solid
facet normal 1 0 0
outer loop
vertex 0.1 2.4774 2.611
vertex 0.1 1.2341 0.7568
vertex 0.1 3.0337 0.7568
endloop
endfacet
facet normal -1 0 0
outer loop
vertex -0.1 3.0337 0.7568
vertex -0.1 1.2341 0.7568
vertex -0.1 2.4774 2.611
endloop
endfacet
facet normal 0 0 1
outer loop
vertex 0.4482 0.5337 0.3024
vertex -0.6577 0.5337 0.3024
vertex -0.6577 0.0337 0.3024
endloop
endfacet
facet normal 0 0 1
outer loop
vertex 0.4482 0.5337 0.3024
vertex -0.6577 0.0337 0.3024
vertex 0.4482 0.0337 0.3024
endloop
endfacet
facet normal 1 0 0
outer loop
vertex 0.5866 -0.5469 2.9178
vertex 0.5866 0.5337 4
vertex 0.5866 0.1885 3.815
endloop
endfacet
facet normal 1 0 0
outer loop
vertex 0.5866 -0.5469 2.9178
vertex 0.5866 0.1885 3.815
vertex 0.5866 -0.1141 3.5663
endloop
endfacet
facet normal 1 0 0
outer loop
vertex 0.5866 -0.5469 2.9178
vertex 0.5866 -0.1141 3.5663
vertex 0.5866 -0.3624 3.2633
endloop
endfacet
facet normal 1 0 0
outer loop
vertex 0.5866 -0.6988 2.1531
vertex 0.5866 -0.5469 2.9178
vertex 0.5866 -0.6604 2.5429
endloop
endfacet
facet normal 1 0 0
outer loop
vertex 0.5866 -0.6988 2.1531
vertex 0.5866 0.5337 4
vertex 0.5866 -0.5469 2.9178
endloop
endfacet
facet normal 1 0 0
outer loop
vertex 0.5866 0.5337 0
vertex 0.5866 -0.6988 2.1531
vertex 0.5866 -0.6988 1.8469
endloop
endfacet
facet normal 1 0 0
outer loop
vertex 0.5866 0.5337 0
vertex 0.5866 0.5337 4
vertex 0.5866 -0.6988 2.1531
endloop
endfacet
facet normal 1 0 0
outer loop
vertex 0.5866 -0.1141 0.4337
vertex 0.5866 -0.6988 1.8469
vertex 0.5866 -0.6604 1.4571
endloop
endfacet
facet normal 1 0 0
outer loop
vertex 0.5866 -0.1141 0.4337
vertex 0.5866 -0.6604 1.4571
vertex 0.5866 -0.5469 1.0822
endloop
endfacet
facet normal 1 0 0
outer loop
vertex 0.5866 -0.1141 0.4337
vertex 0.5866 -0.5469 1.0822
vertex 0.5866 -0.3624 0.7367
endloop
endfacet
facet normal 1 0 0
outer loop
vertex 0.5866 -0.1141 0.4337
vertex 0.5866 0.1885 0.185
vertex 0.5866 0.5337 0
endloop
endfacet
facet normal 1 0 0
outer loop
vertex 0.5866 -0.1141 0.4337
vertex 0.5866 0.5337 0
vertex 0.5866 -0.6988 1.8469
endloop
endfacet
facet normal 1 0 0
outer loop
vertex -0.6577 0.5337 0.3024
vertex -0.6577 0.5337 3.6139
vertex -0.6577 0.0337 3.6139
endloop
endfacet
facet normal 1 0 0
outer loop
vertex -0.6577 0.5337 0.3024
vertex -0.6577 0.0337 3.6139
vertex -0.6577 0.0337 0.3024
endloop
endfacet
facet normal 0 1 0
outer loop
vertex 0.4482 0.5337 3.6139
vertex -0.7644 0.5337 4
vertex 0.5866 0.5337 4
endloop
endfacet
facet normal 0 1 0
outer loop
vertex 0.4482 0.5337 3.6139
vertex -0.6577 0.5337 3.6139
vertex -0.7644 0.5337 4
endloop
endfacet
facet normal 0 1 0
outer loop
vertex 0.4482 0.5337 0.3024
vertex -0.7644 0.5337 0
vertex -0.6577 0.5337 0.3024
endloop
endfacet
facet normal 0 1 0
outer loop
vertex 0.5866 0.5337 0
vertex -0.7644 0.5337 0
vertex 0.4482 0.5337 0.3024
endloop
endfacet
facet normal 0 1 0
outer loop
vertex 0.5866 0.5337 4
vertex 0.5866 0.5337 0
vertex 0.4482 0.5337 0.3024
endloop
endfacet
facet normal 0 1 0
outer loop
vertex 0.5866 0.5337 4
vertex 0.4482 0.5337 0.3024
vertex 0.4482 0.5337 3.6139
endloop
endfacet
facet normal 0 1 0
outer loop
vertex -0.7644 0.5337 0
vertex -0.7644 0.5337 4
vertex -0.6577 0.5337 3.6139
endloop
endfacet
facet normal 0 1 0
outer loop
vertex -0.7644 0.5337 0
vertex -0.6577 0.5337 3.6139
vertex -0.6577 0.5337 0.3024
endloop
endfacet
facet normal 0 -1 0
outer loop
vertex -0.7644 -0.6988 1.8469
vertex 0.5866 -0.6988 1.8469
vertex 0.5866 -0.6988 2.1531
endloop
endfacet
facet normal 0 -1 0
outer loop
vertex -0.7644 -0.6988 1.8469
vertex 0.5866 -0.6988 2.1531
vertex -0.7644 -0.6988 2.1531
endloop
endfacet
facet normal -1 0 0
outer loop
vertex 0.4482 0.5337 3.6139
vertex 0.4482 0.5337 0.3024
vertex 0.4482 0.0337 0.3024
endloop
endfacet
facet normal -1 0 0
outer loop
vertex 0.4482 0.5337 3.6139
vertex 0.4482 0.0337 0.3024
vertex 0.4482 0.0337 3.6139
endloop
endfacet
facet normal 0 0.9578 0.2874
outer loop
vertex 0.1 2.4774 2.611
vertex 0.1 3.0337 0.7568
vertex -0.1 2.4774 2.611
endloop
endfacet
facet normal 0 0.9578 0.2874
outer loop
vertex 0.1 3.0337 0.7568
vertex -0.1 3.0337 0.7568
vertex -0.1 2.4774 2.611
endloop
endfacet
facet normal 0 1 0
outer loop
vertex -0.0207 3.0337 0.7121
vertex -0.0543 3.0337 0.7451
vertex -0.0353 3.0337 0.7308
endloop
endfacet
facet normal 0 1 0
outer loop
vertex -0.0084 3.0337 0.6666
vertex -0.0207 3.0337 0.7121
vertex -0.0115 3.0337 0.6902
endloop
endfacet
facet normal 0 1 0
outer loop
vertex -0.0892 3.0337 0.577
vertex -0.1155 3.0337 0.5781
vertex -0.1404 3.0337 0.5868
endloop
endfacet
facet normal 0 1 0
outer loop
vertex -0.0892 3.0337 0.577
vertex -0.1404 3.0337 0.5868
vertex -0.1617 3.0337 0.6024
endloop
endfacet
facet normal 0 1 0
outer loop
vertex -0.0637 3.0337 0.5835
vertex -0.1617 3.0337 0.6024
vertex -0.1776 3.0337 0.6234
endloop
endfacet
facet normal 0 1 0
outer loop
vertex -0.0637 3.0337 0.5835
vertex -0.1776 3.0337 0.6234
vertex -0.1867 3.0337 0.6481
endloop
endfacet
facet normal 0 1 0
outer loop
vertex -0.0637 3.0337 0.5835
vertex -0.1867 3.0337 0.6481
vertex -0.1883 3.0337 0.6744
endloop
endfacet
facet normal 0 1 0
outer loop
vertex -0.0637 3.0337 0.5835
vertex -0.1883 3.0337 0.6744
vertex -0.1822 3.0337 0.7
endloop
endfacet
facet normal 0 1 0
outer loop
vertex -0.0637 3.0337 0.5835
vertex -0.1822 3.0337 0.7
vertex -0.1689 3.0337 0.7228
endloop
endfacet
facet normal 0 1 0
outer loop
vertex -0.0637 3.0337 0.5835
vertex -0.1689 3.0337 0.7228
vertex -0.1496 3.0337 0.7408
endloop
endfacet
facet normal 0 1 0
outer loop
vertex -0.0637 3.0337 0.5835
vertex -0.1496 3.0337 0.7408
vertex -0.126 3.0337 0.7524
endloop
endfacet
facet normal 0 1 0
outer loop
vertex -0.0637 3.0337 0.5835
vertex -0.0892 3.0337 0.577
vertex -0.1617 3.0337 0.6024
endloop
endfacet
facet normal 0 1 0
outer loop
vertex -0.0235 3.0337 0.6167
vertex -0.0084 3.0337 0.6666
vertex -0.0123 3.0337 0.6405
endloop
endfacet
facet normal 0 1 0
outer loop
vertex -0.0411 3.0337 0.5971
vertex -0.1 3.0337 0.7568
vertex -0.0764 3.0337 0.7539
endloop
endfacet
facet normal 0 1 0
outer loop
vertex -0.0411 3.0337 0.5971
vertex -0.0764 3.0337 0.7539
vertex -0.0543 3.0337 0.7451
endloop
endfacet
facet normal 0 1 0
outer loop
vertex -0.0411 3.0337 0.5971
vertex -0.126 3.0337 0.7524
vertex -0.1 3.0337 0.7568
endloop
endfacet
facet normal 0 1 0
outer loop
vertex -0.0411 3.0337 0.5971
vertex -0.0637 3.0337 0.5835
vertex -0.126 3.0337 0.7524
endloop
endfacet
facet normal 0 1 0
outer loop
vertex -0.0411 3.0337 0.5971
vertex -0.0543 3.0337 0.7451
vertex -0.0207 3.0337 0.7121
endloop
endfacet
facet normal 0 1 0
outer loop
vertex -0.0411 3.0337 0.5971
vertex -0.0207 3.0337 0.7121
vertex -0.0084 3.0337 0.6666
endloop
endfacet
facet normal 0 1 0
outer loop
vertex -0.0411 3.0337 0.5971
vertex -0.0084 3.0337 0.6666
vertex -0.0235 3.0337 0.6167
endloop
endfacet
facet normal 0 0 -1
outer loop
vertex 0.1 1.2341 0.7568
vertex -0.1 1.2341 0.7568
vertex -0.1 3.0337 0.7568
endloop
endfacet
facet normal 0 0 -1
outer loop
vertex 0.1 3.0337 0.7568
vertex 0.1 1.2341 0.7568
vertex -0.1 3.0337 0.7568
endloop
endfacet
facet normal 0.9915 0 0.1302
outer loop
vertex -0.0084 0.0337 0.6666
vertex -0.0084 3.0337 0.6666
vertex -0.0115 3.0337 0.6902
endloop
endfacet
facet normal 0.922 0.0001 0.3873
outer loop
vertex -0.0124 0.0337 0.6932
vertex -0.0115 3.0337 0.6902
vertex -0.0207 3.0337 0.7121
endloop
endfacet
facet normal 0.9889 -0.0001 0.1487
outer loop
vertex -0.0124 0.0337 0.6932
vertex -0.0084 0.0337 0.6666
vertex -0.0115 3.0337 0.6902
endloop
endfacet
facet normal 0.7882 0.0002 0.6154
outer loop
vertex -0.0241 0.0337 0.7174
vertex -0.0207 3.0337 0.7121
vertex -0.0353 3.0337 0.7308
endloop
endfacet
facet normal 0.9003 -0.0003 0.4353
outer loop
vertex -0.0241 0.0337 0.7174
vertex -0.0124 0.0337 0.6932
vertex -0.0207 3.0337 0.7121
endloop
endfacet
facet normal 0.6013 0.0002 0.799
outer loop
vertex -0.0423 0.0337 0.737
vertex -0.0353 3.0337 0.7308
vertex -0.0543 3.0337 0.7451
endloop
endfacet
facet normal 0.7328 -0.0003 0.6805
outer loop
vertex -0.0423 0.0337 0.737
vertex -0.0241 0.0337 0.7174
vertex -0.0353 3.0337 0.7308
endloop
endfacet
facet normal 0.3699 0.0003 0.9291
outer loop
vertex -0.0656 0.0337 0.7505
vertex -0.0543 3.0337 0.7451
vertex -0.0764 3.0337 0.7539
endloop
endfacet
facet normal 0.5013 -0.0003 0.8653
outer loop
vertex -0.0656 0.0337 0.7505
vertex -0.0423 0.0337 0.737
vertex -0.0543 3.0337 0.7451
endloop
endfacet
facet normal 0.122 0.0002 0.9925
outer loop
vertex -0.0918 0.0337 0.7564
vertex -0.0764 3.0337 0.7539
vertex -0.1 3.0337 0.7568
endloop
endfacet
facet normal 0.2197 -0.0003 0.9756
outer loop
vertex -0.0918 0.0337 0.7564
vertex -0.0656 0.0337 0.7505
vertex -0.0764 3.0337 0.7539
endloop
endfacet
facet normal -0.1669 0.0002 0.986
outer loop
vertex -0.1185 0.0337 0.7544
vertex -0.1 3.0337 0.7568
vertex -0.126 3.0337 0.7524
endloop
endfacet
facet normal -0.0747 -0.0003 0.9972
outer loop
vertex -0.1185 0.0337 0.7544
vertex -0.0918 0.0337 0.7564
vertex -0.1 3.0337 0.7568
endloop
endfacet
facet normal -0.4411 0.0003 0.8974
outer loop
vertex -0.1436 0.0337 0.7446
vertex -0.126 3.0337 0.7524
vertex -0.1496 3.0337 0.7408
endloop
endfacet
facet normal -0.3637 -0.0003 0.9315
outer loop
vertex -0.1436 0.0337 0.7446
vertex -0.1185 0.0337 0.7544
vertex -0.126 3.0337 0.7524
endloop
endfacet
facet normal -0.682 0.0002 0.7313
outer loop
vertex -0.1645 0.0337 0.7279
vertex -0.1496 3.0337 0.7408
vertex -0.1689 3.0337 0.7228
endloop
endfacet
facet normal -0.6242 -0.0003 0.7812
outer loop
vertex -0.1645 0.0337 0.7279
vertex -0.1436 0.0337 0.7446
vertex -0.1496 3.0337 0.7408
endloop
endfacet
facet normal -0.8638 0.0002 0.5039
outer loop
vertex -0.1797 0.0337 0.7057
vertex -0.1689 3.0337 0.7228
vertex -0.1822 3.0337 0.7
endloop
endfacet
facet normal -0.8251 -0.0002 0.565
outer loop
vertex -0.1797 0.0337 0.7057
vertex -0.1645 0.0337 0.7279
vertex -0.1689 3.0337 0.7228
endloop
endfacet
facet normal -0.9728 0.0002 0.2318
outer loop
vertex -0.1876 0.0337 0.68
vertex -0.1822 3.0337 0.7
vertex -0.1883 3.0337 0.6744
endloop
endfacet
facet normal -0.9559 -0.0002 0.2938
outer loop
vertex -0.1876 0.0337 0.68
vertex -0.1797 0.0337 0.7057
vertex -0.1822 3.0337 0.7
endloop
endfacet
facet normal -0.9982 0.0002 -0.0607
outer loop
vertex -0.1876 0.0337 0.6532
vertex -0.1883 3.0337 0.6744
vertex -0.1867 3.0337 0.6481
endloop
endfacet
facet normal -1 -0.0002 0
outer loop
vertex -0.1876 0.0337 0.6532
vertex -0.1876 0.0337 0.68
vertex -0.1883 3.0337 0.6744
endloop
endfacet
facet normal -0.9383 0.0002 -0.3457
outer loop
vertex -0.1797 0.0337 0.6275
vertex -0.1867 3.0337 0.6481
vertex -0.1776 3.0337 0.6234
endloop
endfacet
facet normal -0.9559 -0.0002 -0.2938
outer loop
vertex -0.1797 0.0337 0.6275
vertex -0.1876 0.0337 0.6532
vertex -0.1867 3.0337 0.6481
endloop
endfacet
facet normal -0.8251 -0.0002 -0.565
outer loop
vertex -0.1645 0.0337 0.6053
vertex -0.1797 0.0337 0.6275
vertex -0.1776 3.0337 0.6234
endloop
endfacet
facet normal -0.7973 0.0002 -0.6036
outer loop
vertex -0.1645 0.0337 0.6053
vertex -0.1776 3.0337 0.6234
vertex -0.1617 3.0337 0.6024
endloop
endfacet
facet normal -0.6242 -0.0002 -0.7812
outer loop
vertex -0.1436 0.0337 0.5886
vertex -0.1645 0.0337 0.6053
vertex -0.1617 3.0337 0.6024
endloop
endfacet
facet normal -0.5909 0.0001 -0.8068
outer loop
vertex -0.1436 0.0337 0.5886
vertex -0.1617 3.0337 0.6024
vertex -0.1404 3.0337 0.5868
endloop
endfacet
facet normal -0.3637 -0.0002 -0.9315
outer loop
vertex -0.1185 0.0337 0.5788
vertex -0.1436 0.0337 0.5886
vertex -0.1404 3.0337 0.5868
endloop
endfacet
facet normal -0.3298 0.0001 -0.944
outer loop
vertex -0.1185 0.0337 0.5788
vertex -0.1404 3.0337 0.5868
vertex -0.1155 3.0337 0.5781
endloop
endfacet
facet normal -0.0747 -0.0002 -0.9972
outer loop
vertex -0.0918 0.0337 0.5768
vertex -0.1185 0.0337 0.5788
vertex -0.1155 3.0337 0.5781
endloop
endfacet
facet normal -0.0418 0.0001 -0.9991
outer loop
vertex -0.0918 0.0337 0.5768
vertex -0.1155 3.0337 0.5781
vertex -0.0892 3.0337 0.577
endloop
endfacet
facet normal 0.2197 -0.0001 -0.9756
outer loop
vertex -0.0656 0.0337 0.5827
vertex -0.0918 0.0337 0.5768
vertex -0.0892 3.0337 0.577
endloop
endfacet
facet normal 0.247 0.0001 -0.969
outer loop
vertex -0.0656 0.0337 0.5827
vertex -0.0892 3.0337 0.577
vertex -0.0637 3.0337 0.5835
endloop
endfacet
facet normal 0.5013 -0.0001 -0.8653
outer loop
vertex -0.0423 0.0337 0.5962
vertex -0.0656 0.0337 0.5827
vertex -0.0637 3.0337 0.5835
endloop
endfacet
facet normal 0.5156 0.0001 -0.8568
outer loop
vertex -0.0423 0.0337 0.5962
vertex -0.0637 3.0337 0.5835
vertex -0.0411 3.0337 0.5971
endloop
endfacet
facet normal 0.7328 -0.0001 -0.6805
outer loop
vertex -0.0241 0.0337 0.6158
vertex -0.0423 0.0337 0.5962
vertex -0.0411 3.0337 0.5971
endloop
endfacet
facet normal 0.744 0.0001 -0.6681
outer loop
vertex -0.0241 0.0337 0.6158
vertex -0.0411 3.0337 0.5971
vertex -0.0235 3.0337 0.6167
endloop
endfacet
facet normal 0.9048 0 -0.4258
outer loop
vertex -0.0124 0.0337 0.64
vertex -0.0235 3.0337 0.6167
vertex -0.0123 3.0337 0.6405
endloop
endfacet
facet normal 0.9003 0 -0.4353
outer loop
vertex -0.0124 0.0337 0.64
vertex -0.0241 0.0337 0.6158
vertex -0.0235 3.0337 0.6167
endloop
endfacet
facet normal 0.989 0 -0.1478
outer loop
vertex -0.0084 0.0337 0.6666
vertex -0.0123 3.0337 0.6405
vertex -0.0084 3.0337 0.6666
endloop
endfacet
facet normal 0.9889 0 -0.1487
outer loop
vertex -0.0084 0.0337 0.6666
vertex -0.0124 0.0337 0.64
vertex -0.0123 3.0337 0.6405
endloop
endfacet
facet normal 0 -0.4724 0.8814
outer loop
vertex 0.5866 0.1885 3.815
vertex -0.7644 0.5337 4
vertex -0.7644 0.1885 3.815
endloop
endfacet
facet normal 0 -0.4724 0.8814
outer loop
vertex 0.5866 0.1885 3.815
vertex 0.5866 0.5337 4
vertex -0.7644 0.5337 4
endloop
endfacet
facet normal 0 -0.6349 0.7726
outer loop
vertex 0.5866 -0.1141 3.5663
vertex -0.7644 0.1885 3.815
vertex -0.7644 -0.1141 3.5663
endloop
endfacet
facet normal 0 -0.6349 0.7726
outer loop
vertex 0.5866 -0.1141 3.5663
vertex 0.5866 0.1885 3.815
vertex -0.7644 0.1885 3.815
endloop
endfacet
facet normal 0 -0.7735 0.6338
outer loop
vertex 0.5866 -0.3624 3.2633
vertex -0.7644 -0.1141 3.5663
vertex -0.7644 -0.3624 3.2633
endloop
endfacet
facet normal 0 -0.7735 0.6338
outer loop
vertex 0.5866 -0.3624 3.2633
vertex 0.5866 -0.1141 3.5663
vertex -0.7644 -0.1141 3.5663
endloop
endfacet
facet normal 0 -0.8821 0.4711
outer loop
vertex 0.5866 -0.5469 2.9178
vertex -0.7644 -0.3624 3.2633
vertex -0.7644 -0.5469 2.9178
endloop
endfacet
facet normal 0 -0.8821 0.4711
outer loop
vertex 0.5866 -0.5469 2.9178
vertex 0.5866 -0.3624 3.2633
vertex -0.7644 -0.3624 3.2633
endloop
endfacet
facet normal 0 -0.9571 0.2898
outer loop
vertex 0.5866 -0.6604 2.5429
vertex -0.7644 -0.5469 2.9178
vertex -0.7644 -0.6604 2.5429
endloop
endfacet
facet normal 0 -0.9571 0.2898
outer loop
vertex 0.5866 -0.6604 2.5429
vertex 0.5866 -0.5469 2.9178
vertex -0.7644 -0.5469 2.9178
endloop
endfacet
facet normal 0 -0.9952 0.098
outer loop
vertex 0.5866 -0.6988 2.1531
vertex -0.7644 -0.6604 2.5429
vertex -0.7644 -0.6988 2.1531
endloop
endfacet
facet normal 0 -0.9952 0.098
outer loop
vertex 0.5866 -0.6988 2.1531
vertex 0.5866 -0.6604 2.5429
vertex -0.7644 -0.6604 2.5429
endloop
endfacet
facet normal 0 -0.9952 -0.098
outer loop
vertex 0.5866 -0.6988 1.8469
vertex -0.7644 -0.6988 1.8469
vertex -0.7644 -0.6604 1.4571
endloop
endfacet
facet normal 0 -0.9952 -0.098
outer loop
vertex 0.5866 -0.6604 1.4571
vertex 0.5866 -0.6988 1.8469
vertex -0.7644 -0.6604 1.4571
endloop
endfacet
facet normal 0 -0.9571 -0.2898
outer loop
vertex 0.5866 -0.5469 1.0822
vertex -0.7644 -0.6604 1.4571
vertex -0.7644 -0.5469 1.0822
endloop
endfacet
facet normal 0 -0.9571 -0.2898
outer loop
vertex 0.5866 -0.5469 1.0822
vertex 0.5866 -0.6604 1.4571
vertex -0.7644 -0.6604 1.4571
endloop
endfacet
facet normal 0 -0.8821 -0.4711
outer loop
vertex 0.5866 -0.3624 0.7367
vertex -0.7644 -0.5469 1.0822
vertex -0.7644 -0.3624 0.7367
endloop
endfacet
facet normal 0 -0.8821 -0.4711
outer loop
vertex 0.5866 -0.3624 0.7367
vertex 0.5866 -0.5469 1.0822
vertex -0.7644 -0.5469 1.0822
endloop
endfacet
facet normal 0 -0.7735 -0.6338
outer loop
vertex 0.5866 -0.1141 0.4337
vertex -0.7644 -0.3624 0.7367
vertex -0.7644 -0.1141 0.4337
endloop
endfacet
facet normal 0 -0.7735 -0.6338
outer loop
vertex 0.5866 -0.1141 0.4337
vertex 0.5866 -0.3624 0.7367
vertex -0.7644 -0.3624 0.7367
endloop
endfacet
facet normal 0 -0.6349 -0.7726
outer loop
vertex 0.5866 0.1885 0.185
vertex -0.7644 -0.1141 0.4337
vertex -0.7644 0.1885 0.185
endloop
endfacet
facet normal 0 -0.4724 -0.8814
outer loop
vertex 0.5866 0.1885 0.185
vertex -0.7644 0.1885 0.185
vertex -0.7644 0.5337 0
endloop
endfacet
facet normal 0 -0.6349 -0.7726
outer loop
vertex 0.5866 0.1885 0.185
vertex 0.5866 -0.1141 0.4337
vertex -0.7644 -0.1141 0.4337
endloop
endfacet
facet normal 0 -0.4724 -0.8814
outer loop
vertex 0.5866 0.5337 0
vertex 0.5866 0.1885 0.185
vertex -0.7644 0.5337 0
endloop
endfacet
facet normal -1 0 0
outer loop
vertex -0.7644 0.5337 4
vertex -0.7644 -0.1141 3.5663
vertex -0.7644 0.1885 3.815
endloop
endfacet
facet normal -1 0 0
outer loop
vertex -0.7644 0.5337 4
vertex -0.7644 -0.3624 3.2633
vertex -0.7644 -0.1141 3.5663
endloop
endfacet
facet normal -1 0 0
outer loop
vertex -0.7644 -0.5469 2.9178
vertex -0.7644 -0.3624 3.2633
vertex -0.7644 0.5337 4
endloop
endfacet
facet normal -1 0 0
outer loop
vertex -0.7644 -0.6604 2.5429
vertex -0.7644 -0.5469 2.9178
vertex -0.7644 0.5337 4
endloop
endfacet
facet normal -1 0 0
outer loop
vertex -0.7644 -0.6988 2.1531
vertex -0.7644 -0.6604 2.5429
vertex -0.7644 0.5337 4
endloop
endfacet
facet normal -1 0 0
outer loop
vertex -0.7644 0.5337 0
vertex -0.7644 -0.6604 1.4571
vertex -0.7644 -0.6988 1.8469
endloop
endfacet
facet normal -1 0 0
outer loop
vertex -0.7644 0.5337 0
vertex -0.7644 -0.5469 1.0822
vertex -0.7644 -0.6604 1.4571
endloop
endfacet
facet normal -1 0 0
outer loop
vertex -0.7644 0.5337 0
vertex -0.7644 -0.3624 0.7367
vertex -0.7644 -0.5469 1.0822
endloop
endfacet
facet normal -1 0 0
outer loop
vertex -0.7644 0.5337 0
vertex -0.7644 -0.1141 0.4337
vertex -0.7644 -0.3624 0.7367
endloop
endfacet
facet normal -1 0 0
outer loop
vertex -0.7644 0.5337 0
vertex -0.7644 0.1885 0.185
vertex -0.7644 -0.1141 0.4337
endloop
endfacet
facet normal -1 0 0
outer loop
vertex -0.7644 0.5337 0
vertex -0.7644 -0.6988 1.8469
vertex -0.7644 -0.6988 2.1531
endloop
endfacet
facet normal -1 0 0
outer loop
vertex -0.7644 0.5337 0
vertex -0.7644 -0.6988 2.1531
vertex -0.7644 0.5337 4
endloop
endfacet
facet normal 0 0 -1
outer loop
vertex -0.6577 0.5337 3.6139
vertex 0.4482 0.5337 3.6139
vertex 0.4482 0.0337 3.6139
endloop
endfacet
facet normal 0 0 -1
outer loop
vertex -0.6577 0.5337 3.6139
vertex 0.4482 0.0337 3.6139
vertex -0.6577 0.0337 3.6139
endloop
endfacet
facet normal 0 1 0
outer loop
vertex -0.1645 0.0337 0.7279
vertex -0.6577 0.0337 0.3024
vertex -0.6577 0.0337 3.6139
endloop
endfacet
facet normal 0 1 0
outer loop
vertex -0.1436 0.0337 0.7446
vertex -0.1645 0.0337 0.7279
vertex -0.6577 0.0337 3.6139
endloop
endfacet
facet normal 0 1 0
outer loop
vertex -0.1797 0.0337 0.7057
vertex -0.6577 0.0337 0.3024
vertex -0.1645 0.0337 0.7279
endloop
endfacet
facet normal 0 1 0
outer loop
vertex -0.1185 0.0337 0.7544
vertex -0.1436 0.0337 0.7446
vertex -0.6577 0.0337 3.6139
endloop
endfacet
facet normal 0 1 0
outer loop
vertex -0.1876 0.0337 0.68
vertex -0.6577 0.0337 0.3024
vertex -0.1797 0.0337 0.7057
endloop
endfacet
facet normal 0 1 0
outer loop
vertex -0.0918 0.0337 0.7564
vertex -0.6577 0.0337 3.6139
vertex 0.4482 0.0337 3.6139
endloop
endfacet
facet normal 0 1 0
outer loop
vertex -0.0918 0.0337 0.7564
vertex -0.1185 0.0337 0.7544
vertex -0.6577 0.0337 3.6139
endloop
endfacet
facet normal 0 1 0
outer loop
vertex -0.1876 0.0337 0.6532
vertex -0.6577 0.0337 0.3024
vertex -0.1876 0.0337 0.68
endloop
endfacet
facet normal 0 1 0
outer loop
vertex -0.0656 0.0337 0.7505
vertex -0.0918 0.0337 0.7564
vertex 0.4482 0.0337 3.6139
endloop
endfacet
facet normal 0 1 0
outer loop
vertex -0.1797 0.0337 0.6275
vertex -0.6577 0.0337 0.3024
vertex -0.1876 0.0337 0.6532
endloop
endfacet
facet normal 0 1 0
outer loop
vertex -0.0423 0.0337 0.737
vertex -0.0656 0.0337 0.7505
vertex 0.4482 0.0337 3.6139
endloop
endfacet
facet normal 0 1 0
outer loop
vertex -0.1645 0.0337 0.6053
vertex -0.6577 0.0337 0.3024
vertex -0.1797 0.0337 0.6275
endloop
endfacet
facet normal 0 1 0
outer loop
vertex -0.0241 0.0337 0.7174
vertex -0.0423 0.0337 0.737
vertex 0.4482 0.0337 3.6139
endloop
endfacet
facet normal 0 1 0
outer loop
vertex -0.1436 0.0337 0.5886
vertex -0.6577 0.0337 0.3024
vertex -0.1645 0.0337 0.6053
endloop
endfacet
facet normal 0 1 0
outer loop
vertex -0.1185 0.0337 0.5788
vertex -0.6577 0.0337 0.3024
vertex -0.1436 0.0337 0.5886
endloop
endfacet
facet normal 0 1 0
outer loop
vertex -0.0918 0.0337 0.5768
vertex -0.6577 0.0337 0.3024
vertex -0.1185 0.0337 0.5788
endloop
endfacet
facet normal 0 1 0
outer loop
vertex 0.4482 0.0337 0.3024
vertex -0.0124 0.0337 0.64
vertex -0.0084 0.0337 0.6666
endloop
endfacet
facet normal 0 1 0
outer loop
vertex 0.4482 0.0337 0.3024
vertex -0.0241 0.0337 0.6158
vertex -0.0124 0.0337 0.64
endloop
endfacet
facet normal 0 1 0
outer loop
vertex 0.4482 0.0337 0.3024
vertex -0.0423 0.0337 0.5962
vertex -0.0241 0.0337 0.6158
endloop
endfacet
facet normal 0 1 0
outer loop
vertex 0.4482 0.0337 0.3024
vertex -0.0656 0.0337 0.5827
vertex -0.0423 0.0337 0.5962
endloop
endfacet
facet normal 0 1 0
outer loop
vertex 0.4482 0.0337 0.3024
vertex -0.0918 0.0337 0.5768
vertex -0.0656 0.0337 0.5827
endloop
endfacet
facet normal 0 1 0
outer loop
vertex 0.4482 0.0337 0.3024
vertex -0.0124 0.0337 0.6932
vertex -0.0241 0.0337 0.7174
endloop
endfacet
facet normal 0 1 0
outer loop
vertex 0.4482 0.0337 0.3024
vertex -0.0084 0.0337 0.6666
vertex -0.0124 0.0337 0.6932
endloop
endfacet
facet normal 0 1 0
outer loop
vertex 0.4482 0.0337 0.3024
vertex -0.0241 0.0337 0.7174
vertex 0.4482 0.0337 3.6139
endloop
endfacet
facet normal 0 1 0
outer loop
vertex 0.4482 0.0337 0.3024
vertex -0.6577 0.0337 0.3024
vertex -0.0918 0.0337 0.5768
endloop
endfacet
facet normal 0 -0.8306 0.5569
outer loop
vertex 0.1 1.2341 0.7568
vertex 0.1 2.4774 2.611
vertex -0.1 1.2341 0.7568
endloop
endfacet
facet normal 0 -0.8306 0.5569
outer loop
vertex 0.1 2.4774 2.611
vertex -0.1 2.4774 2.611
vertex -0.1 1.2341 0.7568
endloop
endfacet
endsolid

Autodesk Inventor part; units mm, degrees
ref_plane "YZ Plane" through (0, 0, 0) normal (1, 0, 0) x (0, 1, 0)
ref_plane "XZ Plane" through (0, 0, 0) normal (0, 1, 0) x (-1, 0, 0)
ref_plane "XY Plane" through (0, 0, 0) normal (0, 0, 1) x (1, 0, 0)
sketch "Sketch1" plane through (0, 0, 0) normal (0, 0, 1) x (1, 0, 0)
  line L0 (-0.7644, 0.5337) -> (0.5866, 0.5337)
  line L1 (0.5866, 0.5337) -> (0.5866, -0.6988)
  line L2 (0.5866, -0.6988) -> (-0.7644, -0.6988)
  line L3 (-0.7644, -0.6988) -> (-0.7644, 0.5337)
  point P0 (0, 0)
extrude "Extrusion1" add sketch "Sketch1" along normal blind 4
fillet "Fillet1" radius 2 1 edges at (-0.0889, -0.6988, 4)
fillet "Fillet2" radius 2 1 edges at (-0.0889, -0.6988, 0)
sketch "Sketch2" plane through (-0.7644, 0.5337, 4) normal (0, 1, 0) x (1, 0, 0)
  line L0 (1.2126, 0.3861) -> (0.1067, 0.3861)
  line L1 (0.1067, 0.3861) -> (0.1067, 3.6976)
  line L2 (0.1067, 3.6976) -> (1.2126, 3.6976)
  line L3 (1.2126, 3.6976) -> (1.2126, 0.3861)
  point P0 (0.7644, 4)
extrude "Extrusion2" cut sketch "Sketch2" against normal blind 0.5
sketch "Sketch3" plane through (-0.7644, 0.0337, 4) normal (0, 1, 0) x (1, 0, 0)
  circle A0 centre (0.6659, 3.3334) radius 0.0901
  point P0 (0.7644, 4)
extrude "Extrusion3" add sketch "Sketch3" along normal blind 3
sketch "Sketch4" plane through (0, 0, 0) normal (1, 0, 0) x (0, 1, 0)
  line L0 (0.0337, 0.7568) -> (3.0337, 0.7568) projected
  line L1 (3.0337, 0.7568) -> (2.4774, 2.611)
  line L2 (2.4774, 2.611) -> (1.2341, 0.7568)
  line L3 (3.0337, 0.7568) -> (1.2341, 0.7568)
  point P0 (0, 0)
extrude "Extrusion4" add sketch "Sketch4" along normal mid plane 0.2
equation "\"BendRadius\" = Thickness"
equation "\"BendReliefWidth\" = Thickness"
equation "\"BendReliefDepth\" = 0.5 * Thickness"
equation "\"CornerReliefSize\" = 4 * Thickness"
equation "\"MinimumRemnant\" = 2 * Thickness"
equation "\"TransitionRadius\" = BendRadius"
equation "\"JacobiRadiusSize\" = BendRadius"
equation "\"GapSize\" = Thickness"
equation "\"Thickness\" = 0.5"
